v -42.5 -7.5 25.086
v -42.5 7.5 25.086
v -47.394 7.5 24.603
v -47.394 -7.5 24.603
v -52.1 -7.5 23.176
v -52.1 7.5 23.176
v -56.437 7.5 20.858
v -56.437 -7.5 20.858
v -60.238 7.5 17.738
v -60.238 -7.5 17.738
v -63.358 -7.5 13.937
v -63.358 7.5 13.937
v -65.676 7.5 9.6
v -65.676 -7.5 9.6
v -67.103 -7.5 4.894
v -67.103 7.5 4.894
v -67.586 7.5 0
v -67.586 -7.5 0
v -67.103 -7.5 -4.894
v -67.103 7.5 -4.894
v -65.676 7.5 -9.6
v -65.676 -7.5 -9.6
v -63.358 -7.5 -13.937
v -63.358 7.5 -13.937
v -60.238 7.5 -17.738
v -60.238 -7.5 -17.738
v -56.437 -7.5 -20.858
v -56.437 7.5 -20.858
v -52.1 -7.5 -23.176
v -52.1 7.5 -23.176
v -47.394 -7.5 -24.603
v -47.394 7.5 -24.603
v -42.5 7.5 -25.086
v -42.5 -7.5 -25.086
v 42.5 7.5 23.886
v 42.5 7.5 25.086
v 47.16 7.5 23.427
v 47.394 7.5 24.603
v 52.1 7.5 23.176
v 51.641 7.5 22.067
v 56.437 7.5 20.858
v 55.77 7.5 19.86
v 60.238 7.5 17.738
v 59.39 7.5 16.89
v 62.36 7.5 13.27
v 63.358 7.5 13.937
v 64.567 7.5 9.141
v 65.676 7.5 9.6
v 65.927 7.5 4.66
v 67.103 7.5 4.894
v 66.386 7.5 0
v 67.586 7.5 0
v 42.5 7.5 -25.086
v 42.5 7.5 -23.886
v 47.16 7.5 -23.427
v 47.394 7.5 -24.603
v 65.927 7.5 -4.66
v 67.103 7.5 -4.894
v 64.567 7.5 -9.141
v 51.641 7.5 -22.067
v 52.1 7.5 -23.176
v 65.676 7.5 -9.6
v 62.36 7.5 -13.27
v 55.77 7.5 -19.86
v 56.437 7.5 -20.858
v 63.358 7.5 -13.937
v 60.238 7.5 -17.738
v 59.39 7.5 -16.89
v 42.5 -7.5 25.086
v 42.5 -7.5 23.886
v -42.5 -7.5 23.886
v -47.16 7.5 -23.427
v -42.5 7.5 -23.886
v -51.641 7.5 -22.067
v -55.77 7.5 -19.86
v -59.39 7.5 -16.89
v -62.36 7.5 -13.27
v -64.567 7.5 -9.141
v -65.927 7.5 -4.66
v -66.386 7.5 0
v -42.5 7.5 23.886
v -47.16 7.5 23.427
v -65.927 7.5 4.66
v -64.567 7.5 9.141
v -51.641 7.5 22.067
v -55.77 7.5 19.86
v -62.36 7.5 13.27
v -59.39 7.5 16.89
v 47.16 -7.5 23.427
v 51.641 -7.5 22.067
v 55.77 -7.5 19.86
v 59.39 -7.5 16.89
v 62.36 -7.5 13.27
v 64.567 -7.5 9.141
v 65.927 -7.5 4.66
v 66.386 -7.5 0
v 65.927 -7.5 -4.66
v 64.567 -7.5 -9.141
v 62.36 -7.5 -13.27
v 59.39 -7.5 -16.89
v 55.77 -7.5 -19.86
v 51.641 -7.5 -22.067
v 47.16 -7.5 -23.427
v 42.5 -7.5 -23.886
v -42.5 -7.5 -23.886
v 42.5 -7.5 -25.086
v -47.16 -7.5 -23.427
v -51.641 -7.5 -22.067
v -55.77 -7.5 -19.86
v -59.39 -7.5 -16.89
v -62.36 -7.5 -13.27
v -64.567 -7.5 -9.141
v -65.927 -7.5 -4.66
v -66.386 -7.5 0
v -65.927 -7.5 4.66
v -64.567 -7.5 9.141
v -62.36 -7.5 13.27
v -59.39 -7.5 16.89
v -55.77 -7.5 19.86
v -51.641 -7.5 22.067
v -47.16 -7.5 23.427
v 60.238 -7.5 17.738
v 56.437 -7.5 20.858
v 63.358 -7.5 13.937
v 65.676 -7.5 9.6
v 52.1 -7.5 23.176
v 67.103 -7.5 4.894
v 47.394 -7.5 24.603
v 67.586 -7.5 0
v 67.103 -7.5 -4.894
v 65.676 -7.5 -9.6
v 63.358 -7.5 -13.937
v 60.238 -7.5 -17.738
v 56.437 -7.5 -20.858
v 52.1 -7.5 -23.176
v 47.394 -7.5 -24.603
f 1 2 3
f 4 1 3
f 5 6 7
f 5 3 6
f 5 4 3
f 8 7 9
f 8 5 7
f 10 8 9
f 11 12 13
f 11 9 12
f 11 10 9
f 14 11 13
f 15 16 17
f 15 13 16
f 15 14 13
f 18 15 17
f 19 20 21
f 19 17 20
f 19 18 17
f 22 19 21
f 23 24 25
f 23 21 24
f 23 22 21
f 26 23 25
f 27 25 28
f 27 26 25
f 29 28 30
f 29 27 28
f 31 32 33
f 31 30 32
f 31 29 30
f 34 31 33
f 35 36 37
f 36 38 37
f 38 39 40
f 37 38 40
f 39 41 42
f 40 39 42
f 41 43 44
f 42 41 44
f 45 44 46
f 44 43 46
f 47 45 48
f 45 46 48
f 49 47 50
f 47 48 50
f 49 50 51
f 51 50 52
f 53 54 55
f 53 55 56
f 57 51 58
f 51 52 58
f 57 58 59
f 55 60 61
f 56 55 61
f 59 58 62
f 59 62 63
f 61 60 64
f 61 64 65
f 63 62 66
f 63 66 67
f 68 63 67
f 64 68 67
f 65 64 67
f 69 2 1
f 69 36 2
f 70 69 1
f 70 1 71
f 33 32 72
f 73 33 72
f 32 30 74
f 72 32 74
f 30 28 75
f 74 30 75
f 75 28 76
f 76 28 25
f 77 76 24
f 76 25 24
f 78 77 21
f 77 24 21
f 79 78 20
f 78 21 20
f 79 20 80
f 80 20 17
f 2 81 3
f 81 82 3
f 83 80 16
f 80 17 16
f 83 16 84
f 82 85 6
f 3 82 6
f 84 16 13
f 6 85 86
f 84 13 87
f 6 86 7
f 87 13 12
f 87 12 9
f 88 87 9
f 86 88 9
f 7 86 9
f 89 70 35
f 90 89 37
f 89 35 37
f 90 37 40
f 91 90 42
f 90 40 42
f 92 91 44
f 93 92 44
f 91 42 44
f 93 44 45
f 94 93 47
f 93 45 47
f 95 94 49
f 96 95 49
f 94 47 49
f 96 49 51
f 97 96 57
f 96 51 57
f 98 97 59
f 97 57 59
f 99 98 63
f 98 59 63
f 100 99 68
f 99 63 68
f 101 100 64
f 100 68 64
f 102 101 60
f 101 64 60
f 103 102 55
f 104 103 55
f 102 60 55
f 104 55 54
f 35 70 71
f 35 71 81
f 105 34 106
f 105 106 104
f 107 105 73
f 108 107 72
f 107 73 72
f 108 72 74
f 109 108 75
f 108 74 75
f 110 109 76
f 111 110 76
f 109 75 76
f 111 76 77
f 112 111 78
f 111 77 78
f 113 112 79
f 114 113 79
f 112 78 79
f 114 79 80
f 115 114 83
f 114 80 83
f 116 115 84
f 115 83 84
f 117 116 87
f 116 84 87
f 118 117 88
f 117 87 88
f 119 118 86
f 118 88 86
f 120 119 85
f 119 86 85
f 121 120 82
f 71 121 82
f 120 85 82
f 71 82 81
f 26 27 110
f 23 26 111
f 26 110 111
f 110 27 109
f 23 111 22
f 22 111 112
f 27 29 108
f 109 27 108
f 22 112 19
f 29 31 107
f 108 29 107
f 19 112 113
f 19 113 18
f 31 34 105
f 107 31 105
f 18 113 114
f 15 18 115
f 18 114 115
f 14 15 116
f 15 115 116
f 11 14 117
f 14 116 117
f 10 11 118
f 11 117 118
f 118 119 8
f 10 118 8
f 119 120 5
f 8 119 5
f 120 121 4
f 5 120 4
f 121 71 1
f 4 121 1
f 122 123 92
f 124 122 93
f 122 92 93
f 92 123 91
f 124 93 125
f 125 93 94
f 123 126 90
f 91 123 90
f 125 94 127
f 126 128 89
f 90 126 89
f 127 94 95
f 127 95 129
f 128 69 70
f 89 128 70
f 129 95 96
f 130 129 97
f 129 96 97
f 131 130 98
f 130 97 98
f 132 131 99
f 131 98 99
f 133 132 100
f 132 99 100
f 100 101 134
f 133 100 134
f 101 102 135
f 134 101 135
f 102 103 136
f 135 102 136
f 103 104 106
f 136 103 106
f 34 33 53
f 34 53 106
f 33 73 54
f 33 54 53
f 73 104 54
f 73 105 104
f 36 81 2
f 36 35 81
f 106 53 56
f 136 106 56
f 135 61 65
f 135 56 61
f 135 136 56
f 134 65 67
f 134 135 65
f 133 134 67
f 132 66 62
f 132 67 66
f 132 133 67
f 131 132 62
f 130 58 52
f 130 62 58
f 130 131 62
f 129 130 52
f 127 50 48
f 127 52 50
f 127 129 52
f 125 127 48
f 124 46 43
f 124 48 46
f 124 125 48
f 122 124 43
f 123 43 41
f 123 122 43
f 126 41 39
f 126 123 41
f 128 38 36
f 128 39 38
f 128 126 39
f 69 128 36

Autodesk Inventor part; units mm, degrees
ref_plane "YZ Plane" through (0, 0, 0) normal (1, 0, 0) x (0, 1, 0)
ref_plane "XZ Plane" through (0, 0, 0) normal (0, 1, 0) x (-1, 0, 0)
sketch "Sketch1" plane through (0, 0, 0) normal (0, 1, 0) x (-1, 0, 0)
  line L0 (42.5, 0) -> (-42.5, 0) construction
  line L1 (42.5, 23.8855) -> (-42.5, 23.8855)
  line L2 (-42.5, -23.8855) -> (42.5, -23.8855)
  arc A0 (42.5, -23.8855) -> (42.5, 23.8855) centre (42.5, 0) ccw
  arc A1 (-42.5, 23.8855) -> (-42.5, -23.8855) centre (-42.5, 0) ccw
  point P0 (0, 0)
  point P1 (0, 0)
  dimension "d0" = 85
  dimension "d1" = 47.771
ref_plane "Work Plane1" through (-42.5, 0, -23.8855) normal (-1, 0, 0) x (0, -1, 0)
sketch "Sketch2" plane through (-42.5, 0, -23.8855) normal (-1, 0, 0) x (0, -1, 0)
  line L0 (7.5, 0) -> (-7.5, 0)
  line L1 (-7.5, 0) -> (-7.5, -1.2)
  line L2 (-7.5, -1.2) -> (7.5, -1.2)
  line L3 (7.5, -1.2) -> (7.5, 0)
  line L4 (7.5, 0) -> (-7.5, -1.2) construction
  line L5 (-7.5, 0) -> (7.5, -1.2) construction
  point P0 (0, 23.8855)
  point P1 (0, -0.6)
  point P2 (0, 0)
  dimension "d2" = 15
  dimension "d3" = 1.2
sweep "Sweep1" add profiles "Sketch2" path "Sketch1"
properties part number "2309HCMUTE-CDT23-BELT_S5M-320X64X15" material "Rubber"
